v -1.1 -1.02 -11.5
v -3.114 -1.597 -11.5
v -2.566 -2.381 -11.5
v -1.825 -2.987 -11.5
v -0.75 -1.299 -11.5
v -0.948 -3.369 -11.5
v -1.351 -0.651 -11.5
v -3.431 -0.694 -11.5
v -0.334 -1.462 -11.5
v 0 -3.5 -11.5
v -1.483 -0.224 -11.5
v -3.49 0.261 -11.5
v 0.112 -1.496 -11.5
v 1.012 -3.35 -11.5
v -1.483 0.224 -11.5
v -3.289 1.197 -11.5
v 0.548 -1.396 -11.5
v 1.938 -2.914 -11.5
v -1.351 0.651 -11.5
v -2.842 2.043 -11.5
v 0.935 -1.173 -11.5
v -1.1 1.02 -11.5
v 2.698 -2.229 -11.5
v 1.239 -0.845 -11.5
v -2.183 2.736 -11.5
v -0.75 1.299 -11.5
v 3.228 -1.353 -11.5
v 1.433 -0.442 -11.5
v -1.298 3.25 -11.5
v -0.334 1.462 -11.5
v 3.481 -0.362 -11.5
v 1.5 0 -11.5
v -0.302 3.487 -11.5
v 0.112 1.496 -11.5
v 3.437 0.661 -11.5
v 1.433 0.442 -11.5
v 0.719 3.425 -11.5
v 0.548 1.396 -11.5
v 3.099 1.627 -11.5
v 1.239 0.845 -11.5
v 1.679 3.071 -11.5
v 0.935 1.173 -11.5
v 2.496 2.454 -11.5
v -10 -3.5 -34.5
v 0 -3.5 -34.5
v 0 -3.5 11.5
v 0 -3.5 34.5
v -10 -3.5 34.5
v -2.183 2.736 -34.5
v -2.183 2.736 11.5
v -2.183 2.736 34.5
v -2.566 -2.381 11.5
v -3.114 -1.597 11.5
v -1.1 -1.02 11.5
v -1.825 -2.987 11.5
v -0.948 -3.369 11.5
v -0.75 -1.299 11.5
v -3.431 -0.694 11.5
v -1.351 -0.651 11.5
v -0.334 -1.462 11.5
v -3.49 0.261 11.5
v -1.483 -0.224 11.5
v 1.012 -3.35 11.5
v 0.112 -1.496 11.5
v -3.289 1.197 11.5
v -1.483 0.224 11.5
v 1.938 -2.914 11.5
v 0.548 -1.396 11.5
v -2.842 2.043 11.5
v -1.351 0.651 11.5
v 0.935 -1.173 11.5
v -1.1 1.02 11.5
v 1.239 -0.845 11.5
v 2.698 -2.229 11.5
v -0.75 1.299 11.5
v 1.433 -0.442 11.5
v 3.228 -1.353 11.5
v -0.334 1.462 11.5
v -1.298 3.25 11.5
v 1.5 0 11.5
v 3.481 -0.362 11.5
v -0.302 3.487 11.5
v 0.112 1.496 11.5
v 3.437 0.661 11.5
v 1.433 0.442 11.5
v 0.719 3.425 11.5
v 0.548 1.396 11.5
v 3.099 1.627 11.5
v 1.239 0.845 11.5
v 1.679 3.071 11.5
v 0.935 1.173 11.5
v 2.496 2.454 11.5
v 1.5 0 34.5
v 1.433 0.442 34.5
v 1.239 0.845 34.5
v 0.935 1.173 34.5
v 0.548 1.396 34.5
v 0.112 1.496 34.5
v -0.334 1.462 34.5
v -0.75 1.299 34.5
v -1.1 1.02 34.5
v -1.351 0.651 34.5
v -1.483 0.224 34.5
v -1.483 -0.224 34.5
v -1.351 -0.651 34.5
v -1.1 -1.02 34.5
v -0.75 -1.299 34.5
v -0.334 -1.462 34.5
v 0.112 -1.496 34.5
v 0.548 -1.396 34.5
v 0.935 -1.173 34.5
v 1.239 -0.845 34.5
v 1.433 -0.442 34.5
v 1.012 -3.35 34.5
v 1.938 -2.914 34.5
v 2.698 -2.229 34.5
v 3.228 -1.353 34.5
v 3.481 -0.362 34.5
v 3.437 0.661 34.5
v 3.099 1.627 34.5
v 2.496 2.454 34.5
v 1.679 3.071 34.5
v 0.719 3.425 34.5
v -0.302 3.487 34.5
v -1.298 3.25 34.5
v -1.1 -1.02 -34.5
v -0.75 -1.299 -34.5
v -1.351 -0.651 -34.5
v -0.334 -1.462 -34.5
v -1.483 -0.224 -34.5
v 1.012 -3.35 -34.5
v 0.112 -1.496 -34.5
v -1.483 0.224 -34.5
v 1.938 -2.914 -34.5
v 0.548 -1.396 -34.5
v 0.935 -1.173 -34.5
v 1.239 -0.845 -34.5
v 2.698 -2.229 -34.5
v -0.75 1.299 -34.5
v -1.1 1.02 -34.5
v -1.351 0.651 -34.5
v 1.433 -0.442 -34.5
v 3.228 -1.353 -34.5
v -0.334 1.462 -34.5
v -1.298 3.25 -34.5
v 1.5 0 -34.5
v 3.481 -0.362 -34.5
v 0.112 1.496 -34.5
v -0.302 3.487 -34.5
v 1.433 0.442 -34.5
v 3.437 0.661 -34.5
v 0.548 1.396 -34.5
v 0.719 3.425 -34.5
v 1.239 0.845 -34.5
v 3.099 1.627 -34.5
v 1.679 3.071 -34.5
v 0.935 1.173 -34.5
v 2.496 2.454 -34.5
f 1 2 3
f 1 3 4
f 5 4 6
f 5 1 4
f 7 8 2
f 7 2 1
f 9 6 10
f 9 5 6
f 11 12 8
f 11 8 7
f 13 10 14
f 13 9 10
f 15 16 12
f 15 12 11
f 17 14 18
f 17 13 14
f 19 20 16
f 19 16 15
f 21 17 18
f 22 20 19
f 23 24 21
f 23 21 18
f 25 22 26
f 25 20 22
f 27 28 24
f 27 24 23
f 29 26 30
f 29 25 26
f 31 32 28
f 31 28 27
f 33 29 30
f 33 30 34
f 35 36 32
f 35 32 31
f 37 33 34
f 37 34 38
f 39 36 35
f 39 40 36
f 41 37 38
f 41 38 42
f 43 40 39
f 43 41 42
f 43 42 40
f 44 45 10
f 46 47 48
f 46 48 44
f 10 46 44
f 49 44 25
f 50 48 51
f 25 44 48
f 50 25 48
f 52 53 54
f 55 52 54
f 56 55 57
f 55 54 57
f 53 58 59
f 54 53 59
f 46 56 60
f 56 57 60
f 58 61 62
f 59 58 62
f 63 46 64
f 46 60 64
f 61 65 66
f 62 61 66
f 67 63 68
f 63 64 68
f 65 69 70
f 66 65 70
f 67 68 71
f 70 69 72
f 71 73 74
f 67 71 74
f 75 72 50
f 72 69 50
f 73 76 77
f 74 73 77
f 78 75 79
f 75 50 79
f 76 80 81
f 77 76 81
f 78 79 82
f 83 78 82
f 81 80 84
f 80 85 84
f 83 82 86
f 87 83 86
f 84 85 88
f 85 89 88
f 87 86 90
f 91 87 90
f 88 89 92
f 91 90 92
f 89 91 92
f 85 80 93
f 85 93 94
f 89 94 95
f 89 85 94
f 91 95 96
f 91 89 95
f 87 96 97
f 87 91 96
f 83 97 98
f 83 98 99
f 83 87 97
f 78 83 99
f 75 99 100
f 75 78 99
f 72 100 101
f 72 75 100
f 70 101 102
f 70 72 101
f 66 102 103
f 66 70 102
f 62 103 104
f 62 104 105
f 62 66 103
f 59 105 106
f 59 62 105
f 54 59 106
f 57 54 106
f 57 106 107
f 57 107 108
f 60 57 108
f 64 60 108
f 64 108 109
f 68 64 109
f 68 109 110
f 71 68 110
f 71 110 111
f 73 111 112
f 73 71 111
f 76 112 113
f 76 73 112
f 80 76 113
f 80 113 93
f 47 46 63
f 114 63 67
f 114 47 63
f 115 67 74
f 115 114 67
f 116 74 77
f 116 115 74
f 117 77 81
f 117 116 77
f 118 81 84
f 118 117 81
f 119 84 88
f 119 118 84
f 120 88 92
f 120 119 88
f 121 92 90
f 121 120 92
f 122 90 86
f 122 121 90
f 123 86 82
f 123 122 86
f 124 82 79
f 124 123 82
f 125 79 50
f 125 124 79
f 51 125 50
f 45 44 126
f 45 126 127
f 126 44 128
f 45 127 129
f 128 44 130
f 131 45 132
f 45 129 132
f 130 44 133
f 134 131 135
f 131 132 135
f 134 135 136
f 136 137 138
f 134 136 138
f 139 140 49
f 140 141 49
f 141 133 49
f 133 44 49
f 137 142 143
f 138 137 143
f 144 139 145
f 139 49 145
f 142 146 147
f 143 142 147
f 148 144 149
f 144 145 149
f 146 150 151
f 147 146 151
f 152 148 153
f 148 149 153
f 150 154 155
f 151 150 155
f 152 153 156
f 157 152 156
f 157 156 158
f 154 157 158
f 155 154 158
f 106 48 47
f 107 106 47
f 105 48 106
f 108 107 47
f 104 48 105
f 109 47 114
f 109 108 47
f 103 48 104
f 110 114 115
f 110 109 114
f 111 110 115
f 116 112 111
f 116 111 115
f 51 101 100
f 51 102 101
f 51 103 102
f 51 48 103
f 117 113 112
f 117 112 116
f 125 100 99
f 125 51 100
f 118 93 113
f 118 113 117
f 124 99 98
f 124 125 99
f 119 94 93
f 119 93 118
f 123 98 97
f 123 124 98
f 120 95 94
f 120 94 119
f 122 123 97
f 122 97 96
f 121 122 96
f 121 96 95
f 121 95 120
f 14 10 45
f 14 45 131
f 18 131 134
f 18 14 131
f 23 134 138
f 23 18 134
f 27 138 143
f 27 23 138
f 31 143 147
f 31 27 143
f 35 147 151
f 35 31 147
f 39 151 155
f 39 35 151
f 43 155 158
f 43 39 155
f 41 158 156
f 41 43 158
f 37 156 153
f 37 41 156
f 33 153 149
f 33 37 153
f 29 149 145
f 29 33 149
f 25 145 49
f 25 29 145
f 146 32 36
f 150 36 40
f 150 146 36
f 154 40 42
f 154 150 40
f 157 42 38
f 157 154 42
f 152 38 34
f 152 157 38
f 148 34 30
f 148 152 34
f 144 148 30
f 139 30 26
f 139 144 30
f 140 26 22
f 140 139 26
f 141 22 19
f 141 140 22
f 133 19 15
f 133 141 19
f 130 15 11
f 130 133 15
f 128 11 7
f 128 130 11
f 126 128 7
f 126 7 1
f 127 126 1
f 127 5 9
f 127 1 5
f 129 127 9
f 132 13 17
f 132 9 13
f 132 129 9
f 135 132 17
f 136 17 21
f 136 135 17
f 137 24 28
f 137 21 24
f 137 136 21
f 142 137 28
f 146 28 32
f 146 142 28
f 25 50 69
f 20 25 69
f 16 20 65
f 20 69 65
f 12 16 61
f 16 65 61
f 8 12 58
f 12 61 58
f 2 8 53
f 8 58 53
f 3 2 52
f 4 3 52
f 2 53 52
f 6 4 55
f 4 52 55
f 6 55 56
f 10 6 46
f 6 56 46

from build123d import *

# Parameters (mm, degrees)
SKETCH1_R           = 3.5
SKETCH1_R_2         = 1.5
BOSS_EXTRUDE1_DEPTH = 34.5
BOSS_EXTRUDE2_DEPTH = 34.5
SKETCH5_R           = 3.5
CUT_EXTRUDE1_DEPTH  = 11.5


with BuildPart() as part:
    # Sketch1 → Boss-Extrude1 (new, symmetric)
    with BuildSketch(Plane.XY):
        Circle(SKETCH1_R)
        Circle(SKETCH1_R_2, mode=Mode.SUBTRACT)
    extrude(amount=BOSS_EXTRUDE1_DEPTH, both=True)

    # Sketch2 → Boss-Extrude2 (add, symmetric)
    with BuildSketch(Plane.XY):
        with BuildLine():
            Line((0, -3.5), (-10, -3.5))
            Line((-10, -3.5), (-2.182628062, 2.736080178))
            ThreePointArc((-2.182628062, 2.736080178), (-3.303504247, -1.156226487), (0, -3.5))
        make_face()
    extrude(amount=BOSS_EXTRUDE2_DEPTH, both=True)

    # Sketch5 → Cut-Extrude1 (cut, symmetric)
    with BuildSketch(Plane.XY):
        Circle(SKETCH5_R)
    extrude(amount=CUT_EXTRUDE1_DEPTH, both=True, mode=Mode.SUBTRACT)


solid = part.part
